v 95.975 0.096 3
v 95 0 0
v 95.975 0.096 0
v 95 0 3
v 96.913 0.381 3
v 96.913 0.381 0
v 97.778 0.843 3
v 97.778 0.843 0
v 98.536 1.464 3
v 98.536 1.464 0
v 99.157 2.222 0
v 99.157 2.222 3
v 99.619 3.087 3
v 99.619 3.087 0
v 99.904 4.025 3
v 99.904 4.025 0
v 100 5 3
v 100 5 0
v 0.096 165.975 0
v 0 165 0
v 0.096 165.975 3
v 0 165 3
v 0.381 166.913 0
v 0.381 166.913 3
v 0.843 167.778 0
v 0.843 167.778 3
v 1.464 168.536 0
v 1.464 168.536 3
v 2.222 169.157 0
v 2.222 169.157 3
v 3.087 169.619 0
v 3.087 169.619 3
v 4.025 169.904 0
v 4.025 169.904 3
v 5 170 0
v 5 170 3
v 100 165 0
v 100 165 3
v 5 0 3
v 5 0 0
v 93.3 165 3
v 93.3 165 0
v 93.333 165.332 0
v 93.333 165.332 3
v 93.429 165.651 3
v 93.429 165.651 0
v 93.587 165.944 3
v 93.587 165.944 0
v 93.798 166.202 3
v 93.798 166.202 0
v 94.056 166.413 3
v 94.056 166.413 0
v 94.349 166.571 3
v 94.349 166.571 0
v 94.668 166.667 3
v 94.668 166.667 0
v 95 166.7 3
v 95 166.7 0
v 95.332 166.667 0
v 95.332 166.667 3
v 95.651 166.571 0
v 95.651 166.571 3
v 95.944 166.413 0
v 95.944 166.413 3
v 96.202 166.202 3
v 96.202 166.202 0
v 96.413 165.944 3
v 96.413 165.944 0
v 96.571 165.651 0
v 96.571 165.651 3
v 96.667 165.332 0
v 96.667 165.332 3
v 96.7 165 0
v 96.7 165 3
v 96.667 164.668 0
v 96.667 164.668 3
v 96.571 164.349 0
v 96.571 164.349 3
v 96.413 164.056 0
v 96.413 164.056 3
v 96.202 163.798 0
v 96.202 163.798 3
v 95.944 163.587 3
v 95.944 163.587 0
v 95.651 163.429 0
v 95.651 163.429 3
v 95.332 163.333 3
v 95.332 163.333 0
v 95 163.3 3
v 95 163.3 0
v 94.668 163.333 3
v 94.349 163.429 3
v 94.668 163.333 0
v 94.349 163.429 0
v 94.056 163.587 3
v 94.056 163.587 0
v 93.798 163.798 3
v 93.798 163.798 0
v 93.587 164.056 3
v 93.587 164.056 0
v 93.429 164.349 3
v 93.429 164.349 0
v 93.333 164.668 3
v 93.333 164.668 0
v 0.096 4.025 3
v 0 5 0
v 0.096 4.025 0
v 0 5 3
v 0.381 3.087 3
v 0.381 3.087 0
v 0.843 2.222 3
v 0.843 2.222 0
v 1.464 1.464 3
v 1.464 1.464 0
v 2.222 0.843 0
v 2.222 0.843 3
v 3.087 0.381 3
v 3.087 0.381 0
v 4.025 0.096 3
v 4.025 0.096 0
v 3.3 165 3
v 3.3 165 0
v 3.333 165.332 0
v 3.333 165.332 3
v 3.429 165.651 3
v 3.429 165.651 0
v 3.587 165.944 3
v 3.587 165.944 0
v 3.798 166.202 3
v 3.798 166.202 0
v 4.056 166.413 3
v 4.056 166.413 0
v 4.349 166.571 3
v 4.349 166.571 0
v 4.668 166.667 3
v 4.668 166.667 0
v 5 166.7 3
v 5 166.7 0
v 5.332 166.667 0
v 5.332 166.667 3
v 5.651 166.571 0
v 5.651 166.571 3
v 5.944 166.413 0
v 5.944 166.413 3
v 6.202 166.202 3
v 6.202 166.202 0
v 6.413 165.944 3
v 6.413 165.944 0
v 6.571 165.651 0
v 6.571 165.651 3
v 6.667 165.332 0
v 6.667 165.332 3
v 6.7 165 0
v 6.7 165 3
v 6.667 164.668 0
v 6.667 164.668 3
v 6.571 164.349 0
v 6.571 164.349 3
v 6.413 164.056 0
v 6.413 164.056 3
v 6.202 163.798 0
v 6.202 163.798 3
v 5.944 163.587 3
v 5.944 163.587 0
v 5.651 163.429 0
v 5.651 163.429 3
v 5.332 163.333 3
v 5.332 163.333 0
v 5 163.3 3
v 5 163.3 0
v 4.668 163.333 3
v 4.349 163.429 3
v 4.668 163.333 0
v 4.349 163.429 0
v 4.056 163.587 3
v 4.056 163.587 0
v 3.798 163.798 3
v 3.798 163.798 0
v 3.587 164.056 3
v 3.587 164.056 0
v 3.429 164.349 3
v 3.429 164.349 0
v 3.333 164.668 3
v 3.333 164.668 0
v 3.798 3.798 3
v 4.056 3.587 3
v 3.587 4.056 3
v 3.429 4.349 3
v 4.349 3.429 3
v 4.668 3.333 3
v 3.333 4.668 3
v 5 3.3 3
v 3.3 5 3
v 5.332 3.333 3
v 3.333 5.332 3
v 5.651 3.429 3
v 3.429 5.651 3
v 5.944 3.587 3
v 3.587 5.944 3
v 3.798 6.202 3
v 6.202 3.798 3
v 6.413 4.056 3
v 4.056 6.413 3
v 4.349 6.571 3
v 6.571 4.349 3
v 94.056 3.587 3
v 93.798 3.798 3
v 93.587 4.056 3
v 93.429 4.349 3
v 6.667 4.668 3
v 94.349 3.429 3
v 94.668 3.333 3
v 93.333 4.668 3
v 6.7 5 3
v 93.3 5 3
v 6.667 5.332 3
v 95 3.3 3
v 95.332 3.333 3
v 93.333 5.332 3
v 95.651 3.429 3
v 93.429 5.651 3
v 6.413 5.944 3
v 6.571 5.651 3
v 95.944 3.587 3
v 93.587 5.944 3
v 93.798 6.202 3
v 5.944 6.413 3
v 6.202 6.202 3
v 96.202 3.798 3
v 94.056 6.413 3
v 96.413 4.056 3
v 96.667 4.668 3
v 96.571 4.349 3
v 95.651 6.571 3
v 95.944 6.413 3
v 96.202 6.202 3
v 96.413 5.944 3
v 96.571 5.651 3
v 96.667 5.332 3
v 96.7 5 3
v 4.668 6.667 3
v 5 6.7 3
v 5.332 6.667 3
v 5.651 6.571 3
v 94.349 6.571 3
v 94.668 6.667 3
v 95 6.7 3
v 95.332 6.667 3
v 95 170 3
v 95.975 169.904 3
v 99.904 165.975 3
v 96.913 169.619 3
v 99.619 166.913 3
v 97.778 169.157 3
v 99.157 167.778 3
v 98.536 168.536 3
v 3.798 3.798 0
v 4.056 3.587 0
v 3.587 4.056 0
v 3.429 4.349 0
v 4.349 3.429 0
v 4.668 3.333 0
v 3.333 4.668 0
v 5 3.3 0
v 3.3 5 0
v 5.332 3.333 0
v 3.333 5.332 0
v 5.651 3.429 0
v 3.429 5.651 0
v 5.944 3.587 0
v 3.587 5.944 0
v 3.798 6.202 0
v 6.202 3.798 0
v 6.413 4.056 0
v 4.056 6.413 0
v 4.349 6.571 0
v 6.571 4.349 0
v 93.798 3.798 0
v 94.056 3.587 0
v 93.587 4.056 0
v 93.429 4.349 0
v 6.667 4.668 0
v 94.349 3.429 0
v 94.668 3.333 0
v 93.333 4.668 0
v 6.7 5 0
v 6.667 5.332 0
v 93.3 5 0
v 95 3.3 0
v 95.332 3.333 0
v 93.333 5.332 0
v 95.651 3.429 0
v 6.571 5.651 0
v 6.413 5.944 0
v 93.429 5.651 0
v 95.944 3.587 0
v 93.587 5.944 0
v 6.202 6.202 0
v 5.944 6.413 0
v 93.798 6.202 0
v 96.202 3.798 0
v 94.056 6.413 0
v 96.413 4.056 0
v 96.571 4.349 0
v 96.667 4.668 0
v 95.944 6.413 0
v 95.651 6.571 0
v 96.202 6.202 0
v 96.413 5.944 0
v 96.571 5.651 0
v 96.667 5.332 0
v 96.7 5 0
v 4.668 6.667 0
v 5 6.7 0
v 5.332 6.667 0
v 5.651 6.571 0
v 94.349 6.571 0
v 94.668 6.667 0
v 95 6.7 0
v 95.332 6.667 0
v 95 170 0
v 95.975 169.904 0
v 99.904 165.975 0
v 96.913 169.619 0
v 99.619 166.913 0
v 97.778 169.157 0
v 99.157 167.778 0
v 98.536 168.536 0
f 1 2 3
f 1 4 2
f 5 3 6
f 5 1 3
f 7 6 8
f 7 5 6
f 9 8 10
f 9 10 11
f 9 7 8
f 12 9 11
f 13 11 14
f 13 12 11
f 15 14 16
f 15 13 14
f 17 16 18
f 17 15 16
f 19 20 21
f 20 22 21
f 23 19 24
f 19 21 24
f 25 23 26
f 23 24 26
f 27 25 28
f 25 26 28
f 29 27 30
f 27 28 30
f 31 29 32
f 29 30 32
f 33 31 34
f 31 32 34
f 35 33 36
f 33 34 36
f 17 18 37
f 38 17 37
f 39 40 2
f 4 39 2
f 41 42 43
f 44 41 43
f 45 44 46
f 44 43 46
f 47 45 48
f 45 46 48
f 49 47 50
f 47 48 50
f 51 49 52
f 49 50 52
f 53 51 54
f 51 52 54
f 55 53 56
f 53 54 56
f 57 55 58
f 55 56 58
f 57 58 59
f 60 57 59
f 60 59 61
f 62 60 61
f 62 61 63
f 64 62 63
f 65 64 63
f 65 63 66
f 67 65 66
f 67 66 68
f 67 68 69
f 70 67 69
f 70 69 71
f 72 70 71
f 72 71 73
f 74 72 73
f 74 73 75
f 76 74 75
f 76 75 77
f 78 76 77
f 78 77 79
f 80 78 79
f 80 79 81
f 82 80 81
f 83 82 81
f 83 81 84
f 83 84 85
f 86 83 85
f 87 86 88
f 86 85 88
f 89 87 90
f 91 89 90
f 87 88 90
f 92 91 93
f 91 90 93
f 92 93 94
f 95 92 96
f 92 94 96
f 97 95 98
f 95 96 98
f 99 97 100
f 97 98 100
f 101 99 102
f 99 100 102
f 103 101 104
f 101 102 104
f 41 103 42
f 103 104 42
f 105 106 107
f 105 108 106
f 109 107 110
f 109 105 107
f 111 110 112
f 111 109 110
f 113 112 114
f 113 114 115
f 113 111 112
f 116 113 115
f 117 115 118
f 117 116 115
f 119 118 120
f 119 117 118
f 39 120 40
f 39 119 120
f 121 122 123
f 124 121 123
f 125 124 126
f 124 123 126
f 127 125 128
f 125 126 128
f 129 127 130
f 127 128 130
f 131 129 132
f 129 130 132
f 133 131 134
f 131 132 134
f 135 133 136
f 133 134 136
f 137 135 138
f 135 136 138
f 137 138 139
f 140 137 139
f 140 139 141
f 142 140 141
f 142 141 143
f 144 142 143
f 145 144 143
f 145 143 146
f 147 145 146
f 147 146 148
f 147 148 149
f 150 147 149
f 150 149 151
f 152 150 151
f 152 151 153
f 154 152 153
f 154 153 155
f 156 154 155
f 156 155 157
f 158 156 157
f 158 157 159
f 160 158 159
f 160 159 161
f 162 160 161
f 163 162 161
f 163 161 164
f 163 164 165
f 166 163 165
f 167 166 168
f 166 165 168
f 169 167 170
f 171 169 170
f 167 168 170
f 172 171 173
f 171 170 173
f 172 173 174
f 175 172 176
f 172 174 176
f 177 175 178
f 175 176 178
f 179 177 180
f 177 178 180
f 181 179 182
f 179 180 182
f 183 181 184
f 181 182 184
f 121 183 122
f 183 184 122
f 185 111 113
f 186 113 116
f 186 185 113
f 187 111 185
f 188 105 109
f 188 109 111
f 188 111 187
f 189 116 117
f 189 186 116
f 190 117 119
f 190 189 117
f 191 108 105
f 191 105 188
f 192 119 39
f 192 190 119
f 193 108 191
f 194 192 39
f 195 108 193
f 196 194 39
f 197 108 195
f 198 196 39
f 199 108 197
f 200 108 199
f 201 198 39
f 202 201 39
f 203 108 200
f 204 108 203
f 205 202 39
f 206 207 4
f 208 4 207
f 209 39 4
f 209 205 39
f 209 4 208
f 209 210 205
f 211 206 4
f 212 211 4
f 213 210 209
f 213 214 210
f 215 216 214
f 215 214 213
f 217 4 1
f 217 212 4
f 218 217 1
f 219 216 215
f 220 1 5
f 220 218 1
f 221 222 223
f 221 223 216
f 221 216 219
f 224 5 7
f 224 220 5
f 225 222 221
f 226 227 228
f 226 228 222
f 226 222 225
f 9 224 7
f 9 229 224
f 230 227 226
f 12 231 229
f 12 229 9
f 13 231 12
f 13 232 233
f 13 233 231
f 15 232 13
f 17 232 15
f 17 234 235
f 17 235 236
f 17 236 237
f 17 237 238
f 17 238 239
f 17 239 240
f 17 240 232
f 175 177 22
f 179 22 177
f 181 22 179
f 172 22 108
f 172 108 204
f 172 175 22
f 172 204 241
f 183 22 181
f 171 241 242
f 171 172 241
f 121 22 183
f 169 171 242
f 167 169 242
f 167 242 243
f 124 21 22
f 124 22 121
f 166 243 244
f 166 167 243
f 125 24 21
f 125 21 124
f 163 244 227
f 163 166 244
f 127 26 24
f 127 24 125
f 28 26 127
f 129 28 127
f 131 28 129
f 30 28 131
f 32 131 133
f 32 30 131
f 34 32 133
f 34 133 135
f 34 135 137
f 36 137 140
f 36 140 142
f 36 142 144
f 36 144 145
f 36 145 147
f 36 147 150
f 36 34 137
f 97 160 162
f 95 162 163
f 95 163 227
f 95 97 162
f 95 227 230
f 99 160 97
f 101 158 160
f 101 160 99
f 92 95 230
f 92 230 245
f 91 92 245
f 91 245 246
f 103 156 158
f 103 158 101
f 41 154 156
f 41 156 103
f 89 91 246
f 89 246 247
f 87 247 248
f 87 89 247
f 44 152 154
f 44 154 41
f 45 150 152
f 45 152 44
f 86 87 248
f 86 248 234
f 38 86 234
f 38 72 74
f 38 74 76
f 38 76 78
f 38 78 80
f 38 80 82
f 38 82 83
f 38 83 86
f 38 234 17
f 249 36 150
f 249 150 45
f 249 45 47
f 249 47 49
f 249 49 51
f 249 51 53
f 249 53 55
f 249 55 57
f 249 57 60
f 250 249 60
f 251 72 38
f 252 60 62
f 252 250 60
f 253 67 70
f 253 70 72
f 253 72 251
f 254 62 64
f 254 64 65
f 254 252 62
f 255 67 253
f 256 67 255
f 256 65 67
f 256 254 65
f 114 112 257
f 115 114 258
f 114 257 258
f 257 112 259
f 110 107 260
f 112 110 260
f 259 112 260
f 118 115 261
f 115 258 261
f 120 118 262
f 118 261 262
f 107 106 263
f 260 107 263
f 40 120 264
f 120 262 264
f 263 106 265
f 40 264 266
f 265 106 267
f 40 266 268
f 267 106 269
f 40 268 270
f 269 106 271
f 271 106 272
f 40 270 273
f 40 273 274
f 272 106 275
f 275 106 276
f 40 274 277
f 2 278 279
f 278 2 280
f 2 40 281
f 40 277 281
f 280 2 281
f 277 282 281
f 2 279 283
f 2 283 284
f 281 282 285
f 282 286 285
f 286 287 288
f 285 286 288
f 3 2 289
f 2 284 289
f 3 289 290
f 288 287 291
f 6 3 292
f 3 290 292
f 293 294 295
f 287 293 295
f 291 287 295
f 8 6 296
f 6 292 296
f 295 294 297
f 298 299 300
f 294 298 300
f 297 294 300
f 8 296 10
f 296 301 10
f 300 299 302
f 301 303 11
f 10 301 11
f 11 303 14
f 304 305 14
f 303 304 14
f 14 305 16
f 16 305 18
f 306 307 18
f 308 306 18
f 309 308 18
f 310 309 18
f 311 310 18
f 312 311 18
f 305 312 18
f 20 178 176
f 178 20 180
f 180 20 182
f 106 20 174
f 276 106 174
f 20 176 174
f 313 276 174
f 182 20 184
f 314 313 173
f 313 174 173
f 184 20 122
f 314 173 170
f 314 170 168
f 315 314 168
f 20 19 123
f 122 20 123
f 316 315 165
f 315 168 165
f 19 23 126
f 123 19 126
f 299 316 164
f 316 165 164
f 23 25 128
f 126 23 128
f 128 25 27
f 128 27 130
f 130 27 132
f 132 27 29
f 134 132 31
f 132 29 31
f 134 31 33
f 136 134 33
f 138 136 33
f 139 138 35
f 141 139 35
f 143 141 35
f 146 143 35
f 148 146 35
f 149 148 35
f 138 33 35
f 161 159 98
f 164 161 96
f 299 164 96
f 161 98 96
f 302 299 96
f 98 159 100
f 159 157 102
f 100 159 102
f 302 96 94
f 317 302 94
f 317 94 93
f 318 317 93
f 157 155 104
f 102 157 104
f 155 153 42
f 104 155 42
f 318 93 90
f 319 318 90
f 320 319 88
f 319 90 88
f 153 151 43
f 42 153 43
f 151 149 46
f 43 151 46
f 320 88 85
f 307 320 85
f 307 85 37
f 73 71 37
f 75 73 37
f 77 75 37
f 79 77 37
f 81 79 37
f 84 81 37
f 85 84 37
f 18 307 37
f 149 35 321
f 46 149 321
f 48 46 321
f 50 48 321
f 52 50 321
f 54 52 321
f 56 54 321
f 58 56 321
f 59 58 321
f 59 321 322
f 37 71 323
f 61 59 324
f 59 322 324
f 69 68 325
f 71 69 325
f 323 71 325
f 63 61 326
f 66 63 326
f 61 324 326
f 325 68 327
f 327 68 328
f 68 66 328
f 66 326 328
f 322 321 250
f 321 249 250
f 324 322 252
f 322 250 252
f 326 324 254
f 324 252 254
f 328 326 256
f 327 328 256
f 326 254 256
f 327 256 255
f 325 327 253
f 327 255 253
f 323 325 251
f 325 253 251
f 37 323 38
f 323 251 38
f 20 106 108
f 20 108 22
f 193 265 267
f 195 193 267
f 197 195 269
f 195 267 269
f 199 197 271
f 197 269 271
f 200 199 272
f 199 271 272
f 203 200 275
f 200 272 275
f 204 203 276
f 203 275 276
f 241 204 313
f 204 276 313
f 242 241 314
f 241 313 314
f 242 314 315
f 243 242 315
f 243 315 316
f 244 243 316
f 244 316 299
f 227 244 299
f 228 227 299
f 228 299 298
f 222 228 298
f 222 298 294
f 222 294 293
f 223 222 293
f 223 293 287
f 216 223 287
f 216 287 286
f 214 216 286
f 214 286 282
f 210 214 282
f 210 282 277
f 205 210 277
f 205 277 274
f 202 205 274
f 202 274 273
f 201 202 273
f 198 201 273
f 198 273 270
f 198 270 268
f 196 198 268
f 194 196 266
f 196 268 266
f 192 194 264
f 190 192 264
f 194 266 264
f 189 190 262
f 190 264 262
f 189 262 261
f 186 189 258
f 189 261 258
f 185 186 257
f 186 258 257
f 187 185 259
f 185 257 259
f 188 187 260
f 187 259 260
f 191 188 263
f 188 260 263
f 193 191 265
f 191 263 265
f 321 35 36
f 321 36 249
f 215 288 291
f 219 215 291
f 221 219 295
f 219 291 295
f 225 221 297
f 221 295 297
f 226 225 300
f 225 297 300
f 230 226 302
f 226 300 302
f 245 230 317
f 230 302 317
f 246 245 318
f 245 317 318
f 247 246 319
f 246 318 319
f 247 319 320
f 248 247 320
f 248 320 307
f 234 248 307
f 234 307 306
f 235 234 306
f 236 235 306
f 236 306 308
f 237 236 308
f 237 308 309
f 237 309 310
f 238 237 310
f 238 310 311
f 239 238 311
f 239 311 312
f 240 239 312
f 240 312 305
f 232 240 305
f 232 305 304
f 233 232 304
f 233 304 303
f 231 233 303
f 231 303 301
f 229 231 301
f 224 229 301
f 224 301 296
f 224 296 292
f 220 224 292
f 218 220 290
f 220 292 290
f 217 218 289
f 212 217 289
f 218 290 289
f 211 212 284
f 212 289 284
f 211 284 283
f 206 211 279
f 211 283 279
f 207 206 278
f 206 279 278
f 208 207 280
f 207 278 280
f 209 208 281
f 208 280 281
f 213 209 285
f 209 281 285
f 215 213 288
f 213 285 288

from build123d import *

# Parameters (mm, degrees)
SKETCH1_W                = 100
SKETCH1_H                = 170
BOSS_EXTRUDE1_DEPTH      = 3
M3_CLEARANCE_HOLE1_D     = 3.4
M3_CLEARANCE_HOLE1_DEPTH = 7.5
M3_CLEARANCE_HOLE1_TIP   = 1.021463052
FILLET1_R                = 5


with BuildPart() as part:
    # Sketch1 → Boss-Extrude1 (new body)
    with BuildSketch(Plane.XY):
        with Locations((50, 85)):
            Rectangle(SKETCH1_W, SKETCH1_H)
    extrude(amount=BOSS_EXTRUDE1_DEPTH)

    # M3 Clearance Hole1
    with Locations(Plane.XY.offset(3)):
        with Locations((5, 165), (95, 165), (95, 5), (5, 5)):
            Hole(M3_CLEARANCE_HOLE1_D / 2, depth=M3_CLEARANCE_HOLE1_DEPTH)
            with Locations((0, 0, -(M3_CLEARANCE_HOLE1_DEPTH + M3_CLEARANCE_HOLE1_TIP / 2))):  # 118° drill point
                Cone(0, M3_CLEARANCE_HOLE1_D / 2, M3_CLEARANCE_HOLE1_TIP, mode=Mode.SUBTRACT)

    # Fillet1
    fillet1_edges = [part.edges().sort_by_distance(p)[0] for p in [
        (0, 170, 1.5),
        (100, 170, 1.5),
        (100, 0, 1.5),
        (0, 0, 1.5),
    ]]
    fillet(fillet1_edges, radius=FILLET1_R)


solid = part.part
